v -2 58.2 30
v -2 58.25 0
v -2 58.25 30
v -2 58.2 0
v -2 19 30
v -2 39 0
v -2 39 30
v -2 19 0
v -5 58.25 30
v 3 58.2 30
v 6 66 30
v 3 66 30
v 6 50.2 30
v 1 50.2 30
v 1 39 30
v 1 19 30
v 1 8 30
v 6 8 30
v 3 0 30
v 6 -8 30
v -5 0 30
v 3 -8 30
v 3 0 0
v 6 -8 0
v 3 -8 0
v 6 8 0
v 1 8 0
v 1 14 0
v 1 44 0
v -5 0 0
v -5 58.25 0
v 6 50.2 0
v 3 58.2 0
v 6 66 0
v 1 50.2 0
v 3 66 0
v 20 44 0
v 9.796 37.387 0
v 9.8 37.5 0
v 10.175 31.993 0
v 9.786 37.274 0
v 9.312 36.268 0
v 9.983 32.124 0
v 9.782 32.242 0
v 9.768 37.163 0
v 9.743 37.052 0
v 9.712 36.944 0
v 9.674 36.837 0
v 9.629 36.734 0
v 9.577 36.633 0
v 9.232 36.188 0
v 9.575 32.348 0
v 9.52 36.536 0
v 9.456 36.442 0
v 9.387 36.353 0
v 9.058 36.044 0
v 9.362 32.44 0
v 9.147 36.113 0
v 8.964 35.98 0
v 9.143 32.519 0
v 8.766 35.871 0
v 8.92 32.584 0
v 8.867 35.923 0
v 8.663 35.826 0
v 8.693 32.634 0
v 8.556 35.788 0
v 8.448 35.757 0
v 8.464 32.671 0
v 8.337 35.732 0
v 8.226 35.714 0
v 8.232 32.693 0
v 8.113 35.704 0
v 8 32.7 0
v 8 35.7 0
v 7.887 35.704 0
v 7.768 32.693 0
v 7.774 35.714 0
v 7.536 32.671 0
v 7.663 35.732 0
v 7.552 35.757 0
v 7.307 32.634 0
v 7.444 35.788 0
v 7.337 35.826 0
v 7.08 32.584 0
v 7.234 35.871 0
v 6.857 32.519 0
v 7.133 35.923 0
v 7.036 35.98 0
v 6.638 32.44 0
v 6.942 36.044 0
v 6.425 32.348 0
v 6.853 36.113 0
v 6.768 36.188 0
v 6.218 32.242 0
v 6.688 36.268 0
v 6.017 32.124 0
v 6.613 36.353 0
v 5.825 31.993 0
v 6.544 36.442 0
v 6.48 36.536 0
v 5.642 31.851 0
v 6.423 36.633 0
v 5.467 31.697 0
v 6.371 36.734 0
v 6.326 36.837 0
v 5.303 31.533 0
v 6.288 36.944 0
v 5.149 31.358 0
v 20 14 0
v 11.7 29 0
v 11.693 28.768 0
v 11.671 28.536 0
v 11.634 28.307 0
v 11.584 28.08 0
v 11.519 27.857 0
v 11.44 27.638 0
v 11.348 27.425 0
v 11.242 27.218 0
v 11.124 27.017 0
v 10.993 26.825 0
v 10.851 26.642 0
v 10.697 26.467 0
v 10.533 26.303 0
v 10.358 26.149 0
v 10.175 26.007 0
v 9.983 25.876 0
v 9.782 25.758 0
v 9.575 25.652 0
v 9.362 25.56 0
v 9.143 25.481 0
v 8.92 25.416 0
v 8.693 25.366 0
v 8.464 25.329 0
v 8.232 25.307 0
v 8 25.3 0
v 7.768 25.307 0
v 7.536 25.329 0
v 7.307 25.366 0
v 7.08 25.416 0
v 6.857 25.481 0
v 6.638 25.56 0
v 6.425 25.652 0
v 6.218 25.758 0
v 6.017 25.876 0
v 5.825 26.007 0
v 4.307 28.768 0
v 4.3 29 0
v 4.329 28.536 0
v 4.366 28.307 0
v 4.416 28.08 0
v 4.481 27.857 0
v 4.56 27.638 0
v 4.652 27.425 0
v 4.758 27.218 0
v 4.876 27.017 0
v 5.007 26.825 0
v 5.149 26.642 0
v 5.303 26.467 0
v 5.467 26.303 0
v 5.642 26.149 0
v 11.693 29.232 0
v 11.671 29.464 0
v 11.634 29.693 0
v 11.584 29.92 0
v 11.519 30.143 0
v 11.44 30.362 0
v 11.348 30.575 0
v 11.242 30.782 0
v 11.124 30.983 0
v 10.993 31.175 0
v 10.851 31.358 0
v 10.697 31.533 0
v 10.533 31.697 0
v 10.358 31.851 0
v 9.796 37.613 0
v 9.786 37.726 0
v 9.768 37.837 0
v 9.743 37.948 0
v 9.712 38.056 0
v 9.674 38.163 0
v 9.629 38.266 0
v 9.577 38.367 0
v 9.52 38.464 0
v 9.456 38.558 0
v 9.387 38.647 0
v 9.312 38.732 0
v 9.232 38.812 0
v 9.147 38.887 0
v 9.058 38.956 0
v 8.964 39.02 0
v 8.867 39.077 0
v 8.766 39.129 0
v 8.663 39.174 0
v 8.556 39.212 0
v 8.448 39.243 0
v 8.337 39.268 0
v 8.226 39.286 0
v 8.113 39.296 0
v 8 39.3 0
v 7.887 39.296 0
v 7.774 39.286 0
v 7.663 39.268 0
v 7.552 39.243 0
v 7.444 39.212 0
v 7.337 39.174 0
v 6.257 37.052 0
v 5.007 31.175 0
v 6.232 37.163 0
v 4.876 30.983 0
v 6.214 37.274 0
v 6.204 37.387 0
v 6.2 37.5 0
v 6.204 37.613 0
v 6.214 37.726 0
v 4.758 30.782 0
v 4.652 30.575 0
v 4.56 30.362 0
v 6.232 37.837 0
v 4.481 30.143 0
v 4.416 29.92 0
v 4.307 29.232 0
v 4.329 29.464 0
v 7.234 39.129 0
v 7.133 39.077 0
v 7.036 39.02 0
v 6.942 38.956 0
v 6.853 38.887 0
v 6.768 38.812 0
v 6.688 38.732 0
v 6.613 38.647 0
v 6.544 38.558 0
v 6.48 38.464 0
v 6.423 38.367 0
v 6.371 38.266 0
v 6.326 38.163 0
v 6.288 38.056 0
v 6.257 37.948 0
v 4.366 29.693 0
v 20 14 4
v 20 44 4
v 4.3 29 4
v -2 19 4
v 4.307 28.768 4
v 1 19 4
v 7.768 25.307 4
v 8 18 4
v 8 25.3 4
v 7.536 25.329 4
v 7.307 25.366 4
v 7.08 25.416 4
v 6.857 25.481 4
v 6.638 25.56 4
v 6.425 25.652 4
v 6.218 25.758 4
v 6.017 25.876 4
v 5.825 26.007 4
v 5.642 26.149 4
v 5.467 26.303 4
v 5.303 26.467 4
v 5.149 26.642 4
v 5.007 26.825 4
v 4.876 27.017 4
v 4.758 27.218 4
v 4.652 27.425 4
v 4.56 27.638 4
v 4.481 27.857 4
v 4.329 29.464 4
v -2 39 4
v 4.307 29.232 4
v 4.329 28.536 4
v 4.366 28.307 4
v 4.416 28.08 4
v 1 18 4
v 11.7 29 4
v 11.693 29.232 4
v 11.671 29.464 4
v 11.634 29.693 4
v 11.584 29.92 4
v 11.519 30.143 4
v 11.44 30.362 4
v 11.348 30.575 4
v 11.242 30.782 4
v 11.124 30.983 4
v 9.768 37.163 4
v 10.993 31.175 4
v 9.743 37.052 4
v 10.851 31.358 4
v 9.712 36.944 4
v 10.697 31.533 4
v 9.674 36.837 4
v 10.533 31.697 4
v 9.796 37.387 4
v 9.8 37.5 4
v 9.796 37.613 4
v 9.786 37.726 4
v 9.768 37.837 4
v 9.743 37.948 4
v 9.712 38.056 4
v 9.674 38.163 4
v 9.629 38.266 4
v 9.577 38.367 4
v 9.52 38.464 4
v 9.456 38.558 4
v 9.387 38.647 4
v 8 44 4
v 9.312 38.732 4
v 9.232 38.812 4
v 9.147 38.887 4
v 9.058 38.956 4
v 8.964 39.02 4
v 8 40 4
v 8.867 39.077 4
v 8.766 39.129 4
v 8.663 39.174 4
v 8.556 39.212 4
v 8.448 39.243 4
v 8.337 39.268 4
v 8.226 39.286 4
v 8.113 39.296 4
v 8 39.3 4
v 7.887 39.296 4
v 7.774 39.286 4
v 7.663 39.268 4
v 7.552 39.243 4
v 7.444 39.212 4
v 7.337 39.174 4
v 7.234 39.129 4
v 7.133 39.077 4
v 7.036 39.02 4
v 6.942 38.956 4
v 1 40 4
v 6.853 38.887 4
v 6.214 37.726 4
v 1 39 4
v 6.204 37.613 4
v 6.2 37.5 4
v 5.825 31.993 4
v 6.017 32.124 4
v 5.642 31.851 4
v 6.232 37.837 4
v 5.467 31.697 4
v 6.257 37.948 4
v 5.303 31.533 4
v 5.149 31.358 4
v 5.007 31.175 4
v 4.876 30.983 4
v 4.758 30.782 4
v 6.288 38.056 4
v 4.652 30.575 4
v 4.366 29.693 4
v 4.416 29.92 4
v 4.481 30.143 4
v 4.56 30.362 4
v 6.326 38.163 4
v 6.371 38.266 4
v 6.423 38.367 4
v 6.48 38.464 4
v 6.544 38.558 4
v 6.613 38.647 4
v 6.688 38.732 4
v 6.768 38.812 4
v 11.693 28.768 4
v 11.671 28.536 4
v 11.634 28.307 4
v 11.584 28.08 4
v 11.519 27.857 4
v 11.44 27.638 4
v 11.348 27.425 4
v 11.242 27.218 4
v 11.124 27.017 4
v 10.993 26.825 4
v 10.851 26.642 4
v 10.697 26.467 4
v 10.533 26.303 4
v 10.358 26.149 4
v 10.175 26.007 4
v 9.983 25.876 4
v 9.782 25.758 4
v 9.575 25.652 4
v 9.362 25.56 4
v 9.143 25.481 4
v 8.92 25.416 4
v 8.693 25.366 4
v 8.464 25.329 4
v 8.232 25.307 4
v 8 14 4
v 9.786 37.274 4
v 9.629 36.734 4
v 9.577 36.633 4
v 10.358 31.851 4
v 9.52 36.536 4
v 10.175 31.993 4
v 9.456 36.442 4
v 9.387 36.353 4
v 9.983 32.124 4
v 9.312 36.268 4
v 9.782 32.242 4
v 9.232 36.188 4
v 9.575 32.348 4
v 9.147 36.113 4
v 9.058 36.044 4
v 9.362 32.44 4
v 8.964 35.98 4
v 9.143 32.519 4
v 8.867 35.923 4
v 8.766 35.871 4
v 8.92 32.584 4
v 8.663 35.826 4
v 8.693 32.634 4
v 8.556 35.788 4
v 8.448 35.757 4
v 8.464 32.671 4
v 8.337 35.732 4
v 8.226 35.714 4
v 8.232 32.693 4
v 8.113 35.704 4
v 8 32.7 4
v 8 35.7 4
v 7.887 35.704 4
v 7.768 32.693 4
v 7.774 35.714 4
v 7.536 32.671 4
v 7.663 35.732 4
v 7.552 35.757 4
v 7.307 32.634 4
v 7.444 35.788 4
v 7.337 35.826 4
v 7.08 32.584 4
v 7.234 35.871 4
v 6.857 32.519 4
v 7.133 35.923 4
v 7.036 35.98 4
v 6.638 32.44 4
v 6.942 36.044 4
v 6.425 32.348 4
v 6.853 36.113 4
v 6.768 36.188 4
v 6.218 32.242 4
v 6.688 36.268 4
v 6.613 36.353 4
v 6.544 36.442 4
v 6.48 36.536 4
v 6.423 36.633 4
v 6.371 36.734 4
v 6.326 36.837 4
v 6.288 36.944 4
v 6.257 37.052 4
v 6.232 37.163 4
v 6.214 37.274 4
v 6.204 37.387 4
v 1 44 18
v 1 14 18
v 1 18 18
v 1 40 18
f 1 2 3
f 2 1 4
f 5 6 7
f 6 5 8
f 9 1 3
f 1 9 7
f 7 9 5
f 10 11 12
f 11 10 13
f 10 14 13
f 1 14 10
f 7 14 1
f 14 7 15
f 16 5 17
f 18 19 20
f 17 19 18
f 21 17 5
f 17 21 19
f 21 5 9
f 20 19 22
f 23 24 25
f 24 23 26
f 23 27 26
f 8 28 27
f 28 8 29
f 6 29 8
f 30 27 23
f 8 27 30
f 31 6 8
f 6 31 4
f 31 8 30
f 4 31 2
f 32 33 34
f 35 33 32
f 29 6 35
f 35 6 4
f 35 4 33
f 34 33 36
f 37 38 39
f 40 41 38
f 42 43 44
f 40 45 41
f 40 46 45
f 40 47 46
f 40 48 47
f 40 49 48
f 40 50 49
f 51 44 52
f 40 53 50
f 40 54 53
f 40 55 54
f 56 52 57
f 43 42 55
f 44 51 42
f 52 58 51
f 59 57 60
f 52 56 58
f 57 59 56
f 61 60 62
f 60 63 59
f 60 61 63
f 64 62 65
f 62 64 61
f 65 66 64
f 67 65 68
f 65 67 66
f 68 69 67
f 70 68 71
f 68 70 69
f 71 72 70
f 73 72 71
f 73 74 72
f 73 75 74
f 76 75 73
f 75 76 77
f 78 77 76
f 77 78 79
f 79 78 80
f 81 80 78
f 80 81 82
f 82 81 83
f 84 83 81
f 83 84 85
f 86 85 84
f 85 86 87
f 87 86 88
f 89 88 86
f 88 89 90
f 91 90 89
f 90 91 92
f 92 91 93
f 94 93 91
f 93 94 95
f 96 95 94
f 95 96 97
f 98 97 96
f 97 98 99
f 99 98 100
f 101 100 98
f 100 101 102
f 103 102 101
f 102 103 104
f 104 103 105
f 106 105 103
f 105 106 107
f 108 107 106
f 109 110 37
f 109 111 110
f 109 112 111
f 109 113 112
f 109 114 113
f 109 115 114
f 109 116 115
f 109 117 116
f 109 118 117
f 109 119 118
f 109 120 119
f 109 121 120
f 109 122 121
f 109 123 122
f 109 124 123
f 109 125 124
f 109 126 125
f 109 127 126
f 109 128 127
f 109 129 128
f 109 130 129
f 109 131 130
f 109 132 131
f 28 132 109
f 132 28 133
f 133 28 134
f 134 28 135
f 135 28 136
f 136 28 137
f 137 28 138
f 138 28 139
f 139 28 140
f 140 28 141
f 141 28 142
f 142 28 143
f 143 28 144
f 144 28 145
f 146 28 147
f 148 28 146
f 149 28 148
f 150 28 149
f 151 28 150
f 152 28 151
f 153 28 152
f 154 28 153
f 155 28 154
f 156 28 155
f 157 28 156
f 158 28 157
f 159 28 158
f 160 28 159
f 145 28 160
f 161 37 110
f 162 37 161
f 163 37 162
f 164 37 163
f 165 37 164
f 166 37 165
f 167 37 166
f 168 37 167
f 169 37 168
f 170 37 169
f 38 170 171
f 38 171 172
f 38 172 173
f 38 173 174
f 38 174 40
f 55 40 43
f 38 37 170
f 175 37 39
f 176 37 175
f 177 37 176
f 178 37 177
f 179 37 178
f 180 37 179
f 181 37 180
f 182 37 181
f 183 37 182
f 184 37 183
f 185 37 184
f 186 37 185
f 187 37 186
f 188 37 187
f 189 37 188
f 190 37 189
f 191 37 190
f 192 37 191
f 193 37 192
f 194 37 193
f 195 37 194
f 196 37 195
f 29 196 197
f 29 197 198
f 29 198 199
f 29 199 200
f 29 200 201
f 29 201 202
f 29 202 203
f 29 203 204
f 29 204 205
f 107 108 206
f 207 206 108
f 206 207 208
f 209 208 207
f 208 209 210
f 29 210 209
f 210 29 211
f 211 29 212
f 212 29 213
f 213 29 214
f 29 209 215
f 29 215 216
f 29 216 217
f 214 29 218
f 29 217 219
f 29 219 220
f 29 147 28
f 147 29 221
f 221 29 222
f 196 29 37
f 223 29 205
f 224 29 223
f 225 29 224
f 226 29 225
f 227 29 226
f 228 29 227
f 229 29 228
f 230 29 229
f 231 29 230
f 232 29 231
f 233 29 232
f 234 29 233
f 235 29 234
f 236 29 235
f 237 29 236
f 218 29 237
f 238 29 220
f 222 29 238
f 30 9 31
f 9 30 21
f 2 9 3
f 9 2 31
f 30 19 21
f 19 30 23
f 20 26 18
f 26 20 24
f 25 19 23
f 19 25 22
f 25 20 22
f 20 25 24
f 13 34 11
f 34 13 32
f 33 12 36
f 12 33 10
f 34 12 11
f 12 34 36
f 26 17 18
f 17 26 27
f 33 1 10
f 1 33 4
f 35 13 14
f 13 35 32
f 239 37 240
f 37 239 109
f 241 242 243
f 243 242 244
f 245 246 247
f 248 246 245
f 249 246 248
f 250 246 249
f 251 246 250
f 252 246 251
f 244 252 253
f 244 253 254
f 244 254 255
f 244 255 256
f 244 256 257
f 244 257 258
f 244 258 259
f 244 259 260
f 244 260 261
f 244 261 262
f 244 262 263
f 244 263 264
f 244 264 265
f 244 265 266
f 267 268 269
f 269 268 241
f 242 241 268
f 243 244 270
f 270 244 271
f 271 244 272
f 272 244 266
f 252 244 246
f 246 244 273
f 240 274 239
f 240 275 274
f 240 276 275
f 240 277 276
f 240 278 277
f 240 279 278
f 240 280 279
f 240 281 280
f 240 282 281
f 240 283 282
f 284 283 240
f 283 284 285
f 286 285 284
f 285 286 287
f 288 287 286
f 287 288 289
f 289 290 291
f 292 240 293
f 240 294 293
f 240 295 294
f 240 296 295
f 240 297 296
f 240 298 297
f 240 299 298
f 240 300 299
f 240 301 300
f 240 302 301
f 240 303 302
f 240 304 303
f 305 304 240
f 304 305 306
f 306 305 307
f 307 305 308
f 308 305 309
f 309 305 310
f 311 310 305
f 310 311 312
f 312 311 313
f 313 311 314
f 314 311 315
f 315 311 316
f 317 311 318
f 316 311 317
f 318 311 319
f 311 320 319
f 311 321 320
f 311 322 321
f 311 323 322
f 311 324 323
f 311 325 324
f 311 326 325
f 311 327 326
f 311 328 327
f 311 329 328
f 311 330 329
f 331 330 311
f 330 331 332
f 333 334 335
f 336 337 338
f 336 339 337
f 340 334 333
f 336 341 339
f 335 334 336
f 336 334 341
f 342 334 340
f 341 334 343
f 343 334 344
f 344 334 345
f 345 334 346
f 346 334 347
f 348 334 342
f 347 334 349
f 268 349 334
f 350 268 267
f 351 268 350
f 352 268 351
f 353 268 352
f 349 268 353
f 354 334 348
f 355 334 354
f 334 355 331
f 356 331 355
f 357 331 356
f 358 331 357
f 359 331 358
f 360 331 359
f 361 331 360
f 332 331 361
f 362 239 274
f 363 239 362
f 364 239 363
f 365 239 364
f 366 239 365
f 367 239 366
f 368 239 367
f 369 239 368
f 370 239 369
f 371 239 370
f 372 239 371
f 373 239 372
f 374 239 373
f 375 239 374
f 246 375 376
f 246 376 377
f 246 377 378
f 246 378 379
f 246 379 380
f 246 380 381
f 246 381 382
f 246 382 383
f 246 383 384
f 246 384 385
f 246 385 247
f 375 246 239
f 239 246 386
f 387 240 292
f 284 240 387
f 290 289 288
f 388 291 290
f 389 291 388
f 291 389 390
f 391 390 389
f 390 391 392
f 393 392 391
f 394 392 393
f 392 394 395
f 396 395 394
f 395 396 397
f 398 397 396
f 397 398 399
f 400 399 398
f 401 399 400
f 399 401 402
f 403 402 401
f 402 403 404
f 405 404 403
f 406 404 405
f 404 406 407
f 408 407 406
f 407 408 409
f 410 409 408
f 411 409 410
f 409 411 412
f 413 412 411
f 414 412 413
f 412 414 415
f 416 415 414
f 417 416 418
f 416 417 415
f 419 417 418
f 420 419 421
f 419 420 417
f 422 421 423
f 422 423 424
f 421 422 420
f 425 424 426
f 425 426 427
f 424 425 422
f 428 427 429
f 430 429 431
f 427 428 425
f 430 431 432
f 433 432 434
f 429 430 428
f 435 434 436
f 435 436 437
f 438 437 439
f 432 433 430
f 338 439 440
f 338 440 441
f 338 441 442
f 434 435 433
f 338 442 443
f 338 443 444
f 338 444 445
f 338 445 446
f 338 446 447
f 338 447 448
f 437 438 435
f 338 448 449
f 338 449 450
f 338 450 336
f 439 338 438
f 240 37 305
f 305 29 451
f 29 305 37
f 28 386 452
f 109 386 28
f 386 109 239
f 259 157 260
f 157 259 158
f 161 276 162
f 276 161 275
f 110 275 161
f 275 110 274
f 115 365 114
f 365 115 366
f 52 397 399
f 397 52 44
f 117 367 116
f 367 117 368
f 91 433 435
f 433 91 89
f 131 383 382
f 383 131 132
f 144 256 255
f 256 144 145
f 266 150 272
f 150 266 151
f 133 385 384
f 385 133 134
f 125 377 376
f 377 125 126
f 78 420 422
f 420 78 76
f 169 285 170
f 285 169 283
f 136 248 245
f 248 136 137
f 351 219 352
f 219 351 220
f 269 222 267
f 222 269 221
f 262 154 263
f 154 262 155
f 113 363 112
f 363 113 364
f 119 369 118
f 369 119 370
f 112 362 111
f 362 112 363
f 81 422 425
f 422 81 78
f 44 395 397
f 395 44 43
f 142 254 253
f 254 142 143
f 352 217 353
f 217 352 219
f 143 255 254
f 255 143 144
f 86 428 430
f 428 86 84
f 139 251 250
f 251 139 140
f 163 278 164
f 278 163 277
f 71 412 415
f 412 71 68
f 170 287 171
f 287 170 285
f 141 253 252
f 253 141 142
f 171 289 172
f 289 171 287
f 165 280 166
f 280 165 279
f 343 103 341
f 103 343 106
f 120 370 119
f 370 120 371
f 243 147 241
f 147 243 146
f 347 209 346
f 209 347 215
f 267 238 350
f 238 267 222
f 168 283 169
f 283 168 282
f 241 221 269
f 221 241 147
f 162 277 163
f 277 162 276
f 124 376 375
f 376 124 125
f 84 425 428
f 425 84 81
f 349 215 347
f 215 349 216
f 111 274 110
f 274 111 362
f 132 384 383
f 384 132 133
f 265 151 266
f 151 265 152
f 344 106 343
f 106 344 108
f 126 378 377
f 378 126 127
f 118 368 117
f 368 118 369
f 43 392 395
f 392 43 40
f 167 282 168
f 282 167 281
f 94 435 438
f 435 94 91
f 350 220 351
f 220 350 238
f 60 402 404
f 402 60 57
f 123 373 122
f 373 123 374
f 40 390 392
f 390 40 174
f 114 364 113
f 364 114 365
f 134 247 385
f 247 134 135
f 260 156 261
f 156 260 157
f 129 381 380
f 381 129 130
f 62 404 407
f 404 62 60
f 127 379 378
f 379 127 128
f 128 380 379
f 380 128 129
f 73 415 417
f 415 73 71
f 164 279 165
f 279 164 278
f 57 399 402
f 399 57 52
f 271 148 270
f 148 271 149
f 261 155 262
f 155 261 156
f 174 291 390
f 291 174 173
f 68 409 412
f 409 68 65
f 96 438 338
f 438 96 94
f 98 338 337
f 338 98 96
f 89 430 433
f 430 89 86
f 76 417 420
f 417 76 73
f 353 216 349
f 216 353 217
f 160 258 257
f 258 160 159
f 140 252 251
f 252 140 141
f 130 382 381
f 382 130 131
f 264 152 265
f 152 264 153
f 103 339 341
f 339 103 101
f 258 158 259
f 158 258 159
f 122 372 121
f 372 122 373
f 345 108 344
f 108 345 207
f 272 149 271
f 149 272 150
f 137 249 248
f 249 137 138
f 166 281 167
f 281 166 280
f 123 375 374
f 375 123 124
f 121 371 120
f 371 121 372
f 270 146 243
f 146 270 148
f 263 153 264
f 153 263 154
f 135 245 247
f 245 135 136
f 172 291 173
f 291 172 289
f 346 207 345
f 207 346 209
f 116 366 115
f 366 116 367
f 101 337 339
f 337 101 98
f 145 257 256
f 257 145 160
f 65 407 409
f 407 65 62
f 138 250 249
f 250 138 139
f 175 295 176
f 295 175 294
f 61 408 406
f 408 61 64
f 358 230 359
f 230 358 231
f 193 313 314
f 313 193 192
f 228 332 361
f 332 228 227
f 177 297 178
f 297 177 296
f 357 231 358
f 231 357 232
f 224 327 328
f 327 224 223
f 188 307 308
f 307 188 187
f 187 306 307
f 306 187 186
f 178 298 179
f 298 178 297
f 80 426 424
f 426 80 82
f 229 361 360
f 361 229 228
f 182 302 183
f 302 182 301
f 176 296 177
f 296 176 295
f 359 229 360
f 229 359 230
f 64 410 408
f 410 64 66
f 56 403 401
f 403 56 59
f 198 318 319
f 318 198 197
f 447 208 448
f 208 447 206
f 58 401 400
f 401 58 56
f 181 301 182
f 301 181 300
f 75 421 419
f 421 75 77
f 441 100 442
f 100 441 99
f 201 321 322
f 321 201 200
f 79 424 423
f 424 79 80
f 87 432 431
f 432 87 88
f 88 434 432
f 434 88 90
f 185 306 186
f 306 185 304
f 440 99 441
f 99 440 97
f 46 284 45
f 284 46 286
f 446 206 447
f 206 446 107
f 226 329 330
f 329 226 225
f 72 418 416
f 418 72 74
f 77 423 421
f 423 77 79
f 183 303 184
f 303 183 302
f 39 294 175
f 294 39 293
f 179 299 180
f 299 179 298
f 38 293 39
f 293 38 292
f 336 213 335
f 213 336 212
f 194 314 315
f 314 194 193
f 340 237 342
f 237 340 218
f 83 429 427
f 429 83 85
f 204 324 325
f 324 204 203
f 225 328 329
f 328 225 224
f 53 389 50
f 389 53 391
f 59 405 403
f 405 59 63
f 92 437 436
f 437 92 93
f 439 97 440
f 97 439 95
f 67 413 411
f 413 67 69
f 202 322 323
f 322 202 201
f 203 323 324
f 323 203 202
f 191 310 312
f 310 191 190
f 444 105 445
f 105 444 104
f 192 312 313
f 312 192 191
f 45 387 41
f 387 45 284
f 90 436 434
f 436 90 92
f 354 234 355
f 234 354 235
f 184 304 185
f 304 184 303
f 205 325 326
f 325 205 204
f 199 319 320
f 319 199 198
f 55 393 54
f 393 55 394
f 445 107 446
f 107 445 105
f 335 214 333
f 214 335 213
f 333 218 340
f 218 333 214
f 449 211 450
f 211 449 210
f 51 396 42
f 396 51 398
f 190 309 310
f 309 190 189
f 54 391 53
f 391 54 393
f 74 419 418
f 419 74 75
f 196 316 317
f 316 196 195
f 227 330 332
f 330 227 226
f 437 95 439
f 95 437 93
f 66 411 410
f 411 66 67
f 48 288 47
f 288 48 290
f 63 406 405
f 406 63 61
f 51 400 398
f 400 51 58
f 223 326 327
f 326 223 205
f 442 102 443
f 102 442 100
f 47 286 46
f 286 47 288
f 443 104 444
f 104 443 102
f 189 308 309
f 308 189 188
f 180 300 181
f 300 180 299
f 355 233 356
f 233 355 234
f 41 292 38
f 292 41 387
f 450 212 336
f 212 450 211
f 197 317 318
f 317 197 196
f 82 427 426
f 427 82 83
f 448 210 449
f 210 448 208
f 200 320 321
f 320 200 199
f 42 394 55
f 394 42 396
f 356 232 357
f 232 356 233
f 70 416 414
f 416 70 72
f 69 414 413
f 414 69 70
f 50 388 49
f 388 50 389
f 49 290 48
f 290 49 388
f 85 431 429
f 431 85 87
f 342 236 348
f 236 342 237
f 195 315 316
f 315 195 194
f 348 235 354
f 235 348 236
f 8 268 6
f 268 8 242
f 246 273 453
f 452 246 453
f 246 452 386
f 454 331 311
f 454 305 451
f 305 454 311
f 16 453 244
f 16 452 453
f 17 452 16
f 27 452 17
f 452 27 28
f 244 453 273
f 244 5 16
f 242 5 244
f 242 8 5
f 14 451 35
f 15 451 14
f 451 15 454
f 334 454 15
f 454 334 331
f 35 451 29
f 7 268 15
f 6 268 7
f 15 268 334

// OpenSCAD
pot_base_radius = (0.5 * 16.5);
pot_base_depth = 6;
pot_shaft_hole_radius = 3.7;

interior_width = 59;
exterior_width = 75;
plate_thickness = 3.0;

tolerance = 0.75;

$fn = 100;

module pot_tab_hole()
{
	translate(v = [8, 30, -3])
		translate(v = [0, 8.5, 0])
			cylinder(r1 = 1.8, r2 = 1.8, h = 10);
}

module base_plate()
{
	union() {
		translate(v = [-5, 0, 0])
			cube(size = [plate_thickness, interior_width - tolerance, 30]);
		translate(v = [plate_thickness, -8, 0])
			cube(size = [plate_thickness, 15, 30]);
		translate(v = [plate_thickness, interior_width - 8, 0])
			cube(size = [plate_thickness, 15, 30]);
		translate(v = [-2, 0, 0])
			cube(size = [8, 8, 30]);
		translate(v = [-2, 50.2, 0])
			cube(size = [8, 8, 30]);
	}
}

module pot_plate()
{
	difference() {
		translate(v = [-5, 15, 0])
			cube(size = [25, 30, 4]);
		translate(v = [8, 30, -2])
			cylinder(r1 = pot_shaft_hole_radius, r2 = pot_shaft_hole_radius, h = 20);
		pot_tab_hole();
		translate(v = [-5.1, 0, -0.1])
			cube(size = [plate_thickness + 0.1, 100, 2 * plate_thickness]);
	}
}

module gusset()
{
	scale(v = [1, 1, 2]) {
	rotate(v = [0, 0, 1], a = 90)
	difference() {
		cube(size = [4, 10, 10]);
		translate(v = [-0.5, 0, 0])
			rotate(v = [1, 0, 0], a = 45)
				cube(size = [5, 20, 20]);
	}
	}
}

module gussets()
{
	translate(v = [8, 15, 4])
			gusset();
	translate(v = [8, 41, 4])
			gusset();
}

module screw_hole()
{
	rotate(v = [0, 1, 0], a = 90)
		cylinder(r1 = 1.75, r2 = 1.75, h = 100);
}

union() {
union() {
	base_plate();
}

translate(v = [0, -1, 0]) {
	pot_plate();
	gussets();
	translate(v = [-5 + plate_thickness, 5, 0])
		cube(size = [plate_thickness, 15, 30]);
	translate(v = [-5 + plate_thickness, 40, 0])
		cube(size = [plate_thickness, 15, 30]);
}
}
